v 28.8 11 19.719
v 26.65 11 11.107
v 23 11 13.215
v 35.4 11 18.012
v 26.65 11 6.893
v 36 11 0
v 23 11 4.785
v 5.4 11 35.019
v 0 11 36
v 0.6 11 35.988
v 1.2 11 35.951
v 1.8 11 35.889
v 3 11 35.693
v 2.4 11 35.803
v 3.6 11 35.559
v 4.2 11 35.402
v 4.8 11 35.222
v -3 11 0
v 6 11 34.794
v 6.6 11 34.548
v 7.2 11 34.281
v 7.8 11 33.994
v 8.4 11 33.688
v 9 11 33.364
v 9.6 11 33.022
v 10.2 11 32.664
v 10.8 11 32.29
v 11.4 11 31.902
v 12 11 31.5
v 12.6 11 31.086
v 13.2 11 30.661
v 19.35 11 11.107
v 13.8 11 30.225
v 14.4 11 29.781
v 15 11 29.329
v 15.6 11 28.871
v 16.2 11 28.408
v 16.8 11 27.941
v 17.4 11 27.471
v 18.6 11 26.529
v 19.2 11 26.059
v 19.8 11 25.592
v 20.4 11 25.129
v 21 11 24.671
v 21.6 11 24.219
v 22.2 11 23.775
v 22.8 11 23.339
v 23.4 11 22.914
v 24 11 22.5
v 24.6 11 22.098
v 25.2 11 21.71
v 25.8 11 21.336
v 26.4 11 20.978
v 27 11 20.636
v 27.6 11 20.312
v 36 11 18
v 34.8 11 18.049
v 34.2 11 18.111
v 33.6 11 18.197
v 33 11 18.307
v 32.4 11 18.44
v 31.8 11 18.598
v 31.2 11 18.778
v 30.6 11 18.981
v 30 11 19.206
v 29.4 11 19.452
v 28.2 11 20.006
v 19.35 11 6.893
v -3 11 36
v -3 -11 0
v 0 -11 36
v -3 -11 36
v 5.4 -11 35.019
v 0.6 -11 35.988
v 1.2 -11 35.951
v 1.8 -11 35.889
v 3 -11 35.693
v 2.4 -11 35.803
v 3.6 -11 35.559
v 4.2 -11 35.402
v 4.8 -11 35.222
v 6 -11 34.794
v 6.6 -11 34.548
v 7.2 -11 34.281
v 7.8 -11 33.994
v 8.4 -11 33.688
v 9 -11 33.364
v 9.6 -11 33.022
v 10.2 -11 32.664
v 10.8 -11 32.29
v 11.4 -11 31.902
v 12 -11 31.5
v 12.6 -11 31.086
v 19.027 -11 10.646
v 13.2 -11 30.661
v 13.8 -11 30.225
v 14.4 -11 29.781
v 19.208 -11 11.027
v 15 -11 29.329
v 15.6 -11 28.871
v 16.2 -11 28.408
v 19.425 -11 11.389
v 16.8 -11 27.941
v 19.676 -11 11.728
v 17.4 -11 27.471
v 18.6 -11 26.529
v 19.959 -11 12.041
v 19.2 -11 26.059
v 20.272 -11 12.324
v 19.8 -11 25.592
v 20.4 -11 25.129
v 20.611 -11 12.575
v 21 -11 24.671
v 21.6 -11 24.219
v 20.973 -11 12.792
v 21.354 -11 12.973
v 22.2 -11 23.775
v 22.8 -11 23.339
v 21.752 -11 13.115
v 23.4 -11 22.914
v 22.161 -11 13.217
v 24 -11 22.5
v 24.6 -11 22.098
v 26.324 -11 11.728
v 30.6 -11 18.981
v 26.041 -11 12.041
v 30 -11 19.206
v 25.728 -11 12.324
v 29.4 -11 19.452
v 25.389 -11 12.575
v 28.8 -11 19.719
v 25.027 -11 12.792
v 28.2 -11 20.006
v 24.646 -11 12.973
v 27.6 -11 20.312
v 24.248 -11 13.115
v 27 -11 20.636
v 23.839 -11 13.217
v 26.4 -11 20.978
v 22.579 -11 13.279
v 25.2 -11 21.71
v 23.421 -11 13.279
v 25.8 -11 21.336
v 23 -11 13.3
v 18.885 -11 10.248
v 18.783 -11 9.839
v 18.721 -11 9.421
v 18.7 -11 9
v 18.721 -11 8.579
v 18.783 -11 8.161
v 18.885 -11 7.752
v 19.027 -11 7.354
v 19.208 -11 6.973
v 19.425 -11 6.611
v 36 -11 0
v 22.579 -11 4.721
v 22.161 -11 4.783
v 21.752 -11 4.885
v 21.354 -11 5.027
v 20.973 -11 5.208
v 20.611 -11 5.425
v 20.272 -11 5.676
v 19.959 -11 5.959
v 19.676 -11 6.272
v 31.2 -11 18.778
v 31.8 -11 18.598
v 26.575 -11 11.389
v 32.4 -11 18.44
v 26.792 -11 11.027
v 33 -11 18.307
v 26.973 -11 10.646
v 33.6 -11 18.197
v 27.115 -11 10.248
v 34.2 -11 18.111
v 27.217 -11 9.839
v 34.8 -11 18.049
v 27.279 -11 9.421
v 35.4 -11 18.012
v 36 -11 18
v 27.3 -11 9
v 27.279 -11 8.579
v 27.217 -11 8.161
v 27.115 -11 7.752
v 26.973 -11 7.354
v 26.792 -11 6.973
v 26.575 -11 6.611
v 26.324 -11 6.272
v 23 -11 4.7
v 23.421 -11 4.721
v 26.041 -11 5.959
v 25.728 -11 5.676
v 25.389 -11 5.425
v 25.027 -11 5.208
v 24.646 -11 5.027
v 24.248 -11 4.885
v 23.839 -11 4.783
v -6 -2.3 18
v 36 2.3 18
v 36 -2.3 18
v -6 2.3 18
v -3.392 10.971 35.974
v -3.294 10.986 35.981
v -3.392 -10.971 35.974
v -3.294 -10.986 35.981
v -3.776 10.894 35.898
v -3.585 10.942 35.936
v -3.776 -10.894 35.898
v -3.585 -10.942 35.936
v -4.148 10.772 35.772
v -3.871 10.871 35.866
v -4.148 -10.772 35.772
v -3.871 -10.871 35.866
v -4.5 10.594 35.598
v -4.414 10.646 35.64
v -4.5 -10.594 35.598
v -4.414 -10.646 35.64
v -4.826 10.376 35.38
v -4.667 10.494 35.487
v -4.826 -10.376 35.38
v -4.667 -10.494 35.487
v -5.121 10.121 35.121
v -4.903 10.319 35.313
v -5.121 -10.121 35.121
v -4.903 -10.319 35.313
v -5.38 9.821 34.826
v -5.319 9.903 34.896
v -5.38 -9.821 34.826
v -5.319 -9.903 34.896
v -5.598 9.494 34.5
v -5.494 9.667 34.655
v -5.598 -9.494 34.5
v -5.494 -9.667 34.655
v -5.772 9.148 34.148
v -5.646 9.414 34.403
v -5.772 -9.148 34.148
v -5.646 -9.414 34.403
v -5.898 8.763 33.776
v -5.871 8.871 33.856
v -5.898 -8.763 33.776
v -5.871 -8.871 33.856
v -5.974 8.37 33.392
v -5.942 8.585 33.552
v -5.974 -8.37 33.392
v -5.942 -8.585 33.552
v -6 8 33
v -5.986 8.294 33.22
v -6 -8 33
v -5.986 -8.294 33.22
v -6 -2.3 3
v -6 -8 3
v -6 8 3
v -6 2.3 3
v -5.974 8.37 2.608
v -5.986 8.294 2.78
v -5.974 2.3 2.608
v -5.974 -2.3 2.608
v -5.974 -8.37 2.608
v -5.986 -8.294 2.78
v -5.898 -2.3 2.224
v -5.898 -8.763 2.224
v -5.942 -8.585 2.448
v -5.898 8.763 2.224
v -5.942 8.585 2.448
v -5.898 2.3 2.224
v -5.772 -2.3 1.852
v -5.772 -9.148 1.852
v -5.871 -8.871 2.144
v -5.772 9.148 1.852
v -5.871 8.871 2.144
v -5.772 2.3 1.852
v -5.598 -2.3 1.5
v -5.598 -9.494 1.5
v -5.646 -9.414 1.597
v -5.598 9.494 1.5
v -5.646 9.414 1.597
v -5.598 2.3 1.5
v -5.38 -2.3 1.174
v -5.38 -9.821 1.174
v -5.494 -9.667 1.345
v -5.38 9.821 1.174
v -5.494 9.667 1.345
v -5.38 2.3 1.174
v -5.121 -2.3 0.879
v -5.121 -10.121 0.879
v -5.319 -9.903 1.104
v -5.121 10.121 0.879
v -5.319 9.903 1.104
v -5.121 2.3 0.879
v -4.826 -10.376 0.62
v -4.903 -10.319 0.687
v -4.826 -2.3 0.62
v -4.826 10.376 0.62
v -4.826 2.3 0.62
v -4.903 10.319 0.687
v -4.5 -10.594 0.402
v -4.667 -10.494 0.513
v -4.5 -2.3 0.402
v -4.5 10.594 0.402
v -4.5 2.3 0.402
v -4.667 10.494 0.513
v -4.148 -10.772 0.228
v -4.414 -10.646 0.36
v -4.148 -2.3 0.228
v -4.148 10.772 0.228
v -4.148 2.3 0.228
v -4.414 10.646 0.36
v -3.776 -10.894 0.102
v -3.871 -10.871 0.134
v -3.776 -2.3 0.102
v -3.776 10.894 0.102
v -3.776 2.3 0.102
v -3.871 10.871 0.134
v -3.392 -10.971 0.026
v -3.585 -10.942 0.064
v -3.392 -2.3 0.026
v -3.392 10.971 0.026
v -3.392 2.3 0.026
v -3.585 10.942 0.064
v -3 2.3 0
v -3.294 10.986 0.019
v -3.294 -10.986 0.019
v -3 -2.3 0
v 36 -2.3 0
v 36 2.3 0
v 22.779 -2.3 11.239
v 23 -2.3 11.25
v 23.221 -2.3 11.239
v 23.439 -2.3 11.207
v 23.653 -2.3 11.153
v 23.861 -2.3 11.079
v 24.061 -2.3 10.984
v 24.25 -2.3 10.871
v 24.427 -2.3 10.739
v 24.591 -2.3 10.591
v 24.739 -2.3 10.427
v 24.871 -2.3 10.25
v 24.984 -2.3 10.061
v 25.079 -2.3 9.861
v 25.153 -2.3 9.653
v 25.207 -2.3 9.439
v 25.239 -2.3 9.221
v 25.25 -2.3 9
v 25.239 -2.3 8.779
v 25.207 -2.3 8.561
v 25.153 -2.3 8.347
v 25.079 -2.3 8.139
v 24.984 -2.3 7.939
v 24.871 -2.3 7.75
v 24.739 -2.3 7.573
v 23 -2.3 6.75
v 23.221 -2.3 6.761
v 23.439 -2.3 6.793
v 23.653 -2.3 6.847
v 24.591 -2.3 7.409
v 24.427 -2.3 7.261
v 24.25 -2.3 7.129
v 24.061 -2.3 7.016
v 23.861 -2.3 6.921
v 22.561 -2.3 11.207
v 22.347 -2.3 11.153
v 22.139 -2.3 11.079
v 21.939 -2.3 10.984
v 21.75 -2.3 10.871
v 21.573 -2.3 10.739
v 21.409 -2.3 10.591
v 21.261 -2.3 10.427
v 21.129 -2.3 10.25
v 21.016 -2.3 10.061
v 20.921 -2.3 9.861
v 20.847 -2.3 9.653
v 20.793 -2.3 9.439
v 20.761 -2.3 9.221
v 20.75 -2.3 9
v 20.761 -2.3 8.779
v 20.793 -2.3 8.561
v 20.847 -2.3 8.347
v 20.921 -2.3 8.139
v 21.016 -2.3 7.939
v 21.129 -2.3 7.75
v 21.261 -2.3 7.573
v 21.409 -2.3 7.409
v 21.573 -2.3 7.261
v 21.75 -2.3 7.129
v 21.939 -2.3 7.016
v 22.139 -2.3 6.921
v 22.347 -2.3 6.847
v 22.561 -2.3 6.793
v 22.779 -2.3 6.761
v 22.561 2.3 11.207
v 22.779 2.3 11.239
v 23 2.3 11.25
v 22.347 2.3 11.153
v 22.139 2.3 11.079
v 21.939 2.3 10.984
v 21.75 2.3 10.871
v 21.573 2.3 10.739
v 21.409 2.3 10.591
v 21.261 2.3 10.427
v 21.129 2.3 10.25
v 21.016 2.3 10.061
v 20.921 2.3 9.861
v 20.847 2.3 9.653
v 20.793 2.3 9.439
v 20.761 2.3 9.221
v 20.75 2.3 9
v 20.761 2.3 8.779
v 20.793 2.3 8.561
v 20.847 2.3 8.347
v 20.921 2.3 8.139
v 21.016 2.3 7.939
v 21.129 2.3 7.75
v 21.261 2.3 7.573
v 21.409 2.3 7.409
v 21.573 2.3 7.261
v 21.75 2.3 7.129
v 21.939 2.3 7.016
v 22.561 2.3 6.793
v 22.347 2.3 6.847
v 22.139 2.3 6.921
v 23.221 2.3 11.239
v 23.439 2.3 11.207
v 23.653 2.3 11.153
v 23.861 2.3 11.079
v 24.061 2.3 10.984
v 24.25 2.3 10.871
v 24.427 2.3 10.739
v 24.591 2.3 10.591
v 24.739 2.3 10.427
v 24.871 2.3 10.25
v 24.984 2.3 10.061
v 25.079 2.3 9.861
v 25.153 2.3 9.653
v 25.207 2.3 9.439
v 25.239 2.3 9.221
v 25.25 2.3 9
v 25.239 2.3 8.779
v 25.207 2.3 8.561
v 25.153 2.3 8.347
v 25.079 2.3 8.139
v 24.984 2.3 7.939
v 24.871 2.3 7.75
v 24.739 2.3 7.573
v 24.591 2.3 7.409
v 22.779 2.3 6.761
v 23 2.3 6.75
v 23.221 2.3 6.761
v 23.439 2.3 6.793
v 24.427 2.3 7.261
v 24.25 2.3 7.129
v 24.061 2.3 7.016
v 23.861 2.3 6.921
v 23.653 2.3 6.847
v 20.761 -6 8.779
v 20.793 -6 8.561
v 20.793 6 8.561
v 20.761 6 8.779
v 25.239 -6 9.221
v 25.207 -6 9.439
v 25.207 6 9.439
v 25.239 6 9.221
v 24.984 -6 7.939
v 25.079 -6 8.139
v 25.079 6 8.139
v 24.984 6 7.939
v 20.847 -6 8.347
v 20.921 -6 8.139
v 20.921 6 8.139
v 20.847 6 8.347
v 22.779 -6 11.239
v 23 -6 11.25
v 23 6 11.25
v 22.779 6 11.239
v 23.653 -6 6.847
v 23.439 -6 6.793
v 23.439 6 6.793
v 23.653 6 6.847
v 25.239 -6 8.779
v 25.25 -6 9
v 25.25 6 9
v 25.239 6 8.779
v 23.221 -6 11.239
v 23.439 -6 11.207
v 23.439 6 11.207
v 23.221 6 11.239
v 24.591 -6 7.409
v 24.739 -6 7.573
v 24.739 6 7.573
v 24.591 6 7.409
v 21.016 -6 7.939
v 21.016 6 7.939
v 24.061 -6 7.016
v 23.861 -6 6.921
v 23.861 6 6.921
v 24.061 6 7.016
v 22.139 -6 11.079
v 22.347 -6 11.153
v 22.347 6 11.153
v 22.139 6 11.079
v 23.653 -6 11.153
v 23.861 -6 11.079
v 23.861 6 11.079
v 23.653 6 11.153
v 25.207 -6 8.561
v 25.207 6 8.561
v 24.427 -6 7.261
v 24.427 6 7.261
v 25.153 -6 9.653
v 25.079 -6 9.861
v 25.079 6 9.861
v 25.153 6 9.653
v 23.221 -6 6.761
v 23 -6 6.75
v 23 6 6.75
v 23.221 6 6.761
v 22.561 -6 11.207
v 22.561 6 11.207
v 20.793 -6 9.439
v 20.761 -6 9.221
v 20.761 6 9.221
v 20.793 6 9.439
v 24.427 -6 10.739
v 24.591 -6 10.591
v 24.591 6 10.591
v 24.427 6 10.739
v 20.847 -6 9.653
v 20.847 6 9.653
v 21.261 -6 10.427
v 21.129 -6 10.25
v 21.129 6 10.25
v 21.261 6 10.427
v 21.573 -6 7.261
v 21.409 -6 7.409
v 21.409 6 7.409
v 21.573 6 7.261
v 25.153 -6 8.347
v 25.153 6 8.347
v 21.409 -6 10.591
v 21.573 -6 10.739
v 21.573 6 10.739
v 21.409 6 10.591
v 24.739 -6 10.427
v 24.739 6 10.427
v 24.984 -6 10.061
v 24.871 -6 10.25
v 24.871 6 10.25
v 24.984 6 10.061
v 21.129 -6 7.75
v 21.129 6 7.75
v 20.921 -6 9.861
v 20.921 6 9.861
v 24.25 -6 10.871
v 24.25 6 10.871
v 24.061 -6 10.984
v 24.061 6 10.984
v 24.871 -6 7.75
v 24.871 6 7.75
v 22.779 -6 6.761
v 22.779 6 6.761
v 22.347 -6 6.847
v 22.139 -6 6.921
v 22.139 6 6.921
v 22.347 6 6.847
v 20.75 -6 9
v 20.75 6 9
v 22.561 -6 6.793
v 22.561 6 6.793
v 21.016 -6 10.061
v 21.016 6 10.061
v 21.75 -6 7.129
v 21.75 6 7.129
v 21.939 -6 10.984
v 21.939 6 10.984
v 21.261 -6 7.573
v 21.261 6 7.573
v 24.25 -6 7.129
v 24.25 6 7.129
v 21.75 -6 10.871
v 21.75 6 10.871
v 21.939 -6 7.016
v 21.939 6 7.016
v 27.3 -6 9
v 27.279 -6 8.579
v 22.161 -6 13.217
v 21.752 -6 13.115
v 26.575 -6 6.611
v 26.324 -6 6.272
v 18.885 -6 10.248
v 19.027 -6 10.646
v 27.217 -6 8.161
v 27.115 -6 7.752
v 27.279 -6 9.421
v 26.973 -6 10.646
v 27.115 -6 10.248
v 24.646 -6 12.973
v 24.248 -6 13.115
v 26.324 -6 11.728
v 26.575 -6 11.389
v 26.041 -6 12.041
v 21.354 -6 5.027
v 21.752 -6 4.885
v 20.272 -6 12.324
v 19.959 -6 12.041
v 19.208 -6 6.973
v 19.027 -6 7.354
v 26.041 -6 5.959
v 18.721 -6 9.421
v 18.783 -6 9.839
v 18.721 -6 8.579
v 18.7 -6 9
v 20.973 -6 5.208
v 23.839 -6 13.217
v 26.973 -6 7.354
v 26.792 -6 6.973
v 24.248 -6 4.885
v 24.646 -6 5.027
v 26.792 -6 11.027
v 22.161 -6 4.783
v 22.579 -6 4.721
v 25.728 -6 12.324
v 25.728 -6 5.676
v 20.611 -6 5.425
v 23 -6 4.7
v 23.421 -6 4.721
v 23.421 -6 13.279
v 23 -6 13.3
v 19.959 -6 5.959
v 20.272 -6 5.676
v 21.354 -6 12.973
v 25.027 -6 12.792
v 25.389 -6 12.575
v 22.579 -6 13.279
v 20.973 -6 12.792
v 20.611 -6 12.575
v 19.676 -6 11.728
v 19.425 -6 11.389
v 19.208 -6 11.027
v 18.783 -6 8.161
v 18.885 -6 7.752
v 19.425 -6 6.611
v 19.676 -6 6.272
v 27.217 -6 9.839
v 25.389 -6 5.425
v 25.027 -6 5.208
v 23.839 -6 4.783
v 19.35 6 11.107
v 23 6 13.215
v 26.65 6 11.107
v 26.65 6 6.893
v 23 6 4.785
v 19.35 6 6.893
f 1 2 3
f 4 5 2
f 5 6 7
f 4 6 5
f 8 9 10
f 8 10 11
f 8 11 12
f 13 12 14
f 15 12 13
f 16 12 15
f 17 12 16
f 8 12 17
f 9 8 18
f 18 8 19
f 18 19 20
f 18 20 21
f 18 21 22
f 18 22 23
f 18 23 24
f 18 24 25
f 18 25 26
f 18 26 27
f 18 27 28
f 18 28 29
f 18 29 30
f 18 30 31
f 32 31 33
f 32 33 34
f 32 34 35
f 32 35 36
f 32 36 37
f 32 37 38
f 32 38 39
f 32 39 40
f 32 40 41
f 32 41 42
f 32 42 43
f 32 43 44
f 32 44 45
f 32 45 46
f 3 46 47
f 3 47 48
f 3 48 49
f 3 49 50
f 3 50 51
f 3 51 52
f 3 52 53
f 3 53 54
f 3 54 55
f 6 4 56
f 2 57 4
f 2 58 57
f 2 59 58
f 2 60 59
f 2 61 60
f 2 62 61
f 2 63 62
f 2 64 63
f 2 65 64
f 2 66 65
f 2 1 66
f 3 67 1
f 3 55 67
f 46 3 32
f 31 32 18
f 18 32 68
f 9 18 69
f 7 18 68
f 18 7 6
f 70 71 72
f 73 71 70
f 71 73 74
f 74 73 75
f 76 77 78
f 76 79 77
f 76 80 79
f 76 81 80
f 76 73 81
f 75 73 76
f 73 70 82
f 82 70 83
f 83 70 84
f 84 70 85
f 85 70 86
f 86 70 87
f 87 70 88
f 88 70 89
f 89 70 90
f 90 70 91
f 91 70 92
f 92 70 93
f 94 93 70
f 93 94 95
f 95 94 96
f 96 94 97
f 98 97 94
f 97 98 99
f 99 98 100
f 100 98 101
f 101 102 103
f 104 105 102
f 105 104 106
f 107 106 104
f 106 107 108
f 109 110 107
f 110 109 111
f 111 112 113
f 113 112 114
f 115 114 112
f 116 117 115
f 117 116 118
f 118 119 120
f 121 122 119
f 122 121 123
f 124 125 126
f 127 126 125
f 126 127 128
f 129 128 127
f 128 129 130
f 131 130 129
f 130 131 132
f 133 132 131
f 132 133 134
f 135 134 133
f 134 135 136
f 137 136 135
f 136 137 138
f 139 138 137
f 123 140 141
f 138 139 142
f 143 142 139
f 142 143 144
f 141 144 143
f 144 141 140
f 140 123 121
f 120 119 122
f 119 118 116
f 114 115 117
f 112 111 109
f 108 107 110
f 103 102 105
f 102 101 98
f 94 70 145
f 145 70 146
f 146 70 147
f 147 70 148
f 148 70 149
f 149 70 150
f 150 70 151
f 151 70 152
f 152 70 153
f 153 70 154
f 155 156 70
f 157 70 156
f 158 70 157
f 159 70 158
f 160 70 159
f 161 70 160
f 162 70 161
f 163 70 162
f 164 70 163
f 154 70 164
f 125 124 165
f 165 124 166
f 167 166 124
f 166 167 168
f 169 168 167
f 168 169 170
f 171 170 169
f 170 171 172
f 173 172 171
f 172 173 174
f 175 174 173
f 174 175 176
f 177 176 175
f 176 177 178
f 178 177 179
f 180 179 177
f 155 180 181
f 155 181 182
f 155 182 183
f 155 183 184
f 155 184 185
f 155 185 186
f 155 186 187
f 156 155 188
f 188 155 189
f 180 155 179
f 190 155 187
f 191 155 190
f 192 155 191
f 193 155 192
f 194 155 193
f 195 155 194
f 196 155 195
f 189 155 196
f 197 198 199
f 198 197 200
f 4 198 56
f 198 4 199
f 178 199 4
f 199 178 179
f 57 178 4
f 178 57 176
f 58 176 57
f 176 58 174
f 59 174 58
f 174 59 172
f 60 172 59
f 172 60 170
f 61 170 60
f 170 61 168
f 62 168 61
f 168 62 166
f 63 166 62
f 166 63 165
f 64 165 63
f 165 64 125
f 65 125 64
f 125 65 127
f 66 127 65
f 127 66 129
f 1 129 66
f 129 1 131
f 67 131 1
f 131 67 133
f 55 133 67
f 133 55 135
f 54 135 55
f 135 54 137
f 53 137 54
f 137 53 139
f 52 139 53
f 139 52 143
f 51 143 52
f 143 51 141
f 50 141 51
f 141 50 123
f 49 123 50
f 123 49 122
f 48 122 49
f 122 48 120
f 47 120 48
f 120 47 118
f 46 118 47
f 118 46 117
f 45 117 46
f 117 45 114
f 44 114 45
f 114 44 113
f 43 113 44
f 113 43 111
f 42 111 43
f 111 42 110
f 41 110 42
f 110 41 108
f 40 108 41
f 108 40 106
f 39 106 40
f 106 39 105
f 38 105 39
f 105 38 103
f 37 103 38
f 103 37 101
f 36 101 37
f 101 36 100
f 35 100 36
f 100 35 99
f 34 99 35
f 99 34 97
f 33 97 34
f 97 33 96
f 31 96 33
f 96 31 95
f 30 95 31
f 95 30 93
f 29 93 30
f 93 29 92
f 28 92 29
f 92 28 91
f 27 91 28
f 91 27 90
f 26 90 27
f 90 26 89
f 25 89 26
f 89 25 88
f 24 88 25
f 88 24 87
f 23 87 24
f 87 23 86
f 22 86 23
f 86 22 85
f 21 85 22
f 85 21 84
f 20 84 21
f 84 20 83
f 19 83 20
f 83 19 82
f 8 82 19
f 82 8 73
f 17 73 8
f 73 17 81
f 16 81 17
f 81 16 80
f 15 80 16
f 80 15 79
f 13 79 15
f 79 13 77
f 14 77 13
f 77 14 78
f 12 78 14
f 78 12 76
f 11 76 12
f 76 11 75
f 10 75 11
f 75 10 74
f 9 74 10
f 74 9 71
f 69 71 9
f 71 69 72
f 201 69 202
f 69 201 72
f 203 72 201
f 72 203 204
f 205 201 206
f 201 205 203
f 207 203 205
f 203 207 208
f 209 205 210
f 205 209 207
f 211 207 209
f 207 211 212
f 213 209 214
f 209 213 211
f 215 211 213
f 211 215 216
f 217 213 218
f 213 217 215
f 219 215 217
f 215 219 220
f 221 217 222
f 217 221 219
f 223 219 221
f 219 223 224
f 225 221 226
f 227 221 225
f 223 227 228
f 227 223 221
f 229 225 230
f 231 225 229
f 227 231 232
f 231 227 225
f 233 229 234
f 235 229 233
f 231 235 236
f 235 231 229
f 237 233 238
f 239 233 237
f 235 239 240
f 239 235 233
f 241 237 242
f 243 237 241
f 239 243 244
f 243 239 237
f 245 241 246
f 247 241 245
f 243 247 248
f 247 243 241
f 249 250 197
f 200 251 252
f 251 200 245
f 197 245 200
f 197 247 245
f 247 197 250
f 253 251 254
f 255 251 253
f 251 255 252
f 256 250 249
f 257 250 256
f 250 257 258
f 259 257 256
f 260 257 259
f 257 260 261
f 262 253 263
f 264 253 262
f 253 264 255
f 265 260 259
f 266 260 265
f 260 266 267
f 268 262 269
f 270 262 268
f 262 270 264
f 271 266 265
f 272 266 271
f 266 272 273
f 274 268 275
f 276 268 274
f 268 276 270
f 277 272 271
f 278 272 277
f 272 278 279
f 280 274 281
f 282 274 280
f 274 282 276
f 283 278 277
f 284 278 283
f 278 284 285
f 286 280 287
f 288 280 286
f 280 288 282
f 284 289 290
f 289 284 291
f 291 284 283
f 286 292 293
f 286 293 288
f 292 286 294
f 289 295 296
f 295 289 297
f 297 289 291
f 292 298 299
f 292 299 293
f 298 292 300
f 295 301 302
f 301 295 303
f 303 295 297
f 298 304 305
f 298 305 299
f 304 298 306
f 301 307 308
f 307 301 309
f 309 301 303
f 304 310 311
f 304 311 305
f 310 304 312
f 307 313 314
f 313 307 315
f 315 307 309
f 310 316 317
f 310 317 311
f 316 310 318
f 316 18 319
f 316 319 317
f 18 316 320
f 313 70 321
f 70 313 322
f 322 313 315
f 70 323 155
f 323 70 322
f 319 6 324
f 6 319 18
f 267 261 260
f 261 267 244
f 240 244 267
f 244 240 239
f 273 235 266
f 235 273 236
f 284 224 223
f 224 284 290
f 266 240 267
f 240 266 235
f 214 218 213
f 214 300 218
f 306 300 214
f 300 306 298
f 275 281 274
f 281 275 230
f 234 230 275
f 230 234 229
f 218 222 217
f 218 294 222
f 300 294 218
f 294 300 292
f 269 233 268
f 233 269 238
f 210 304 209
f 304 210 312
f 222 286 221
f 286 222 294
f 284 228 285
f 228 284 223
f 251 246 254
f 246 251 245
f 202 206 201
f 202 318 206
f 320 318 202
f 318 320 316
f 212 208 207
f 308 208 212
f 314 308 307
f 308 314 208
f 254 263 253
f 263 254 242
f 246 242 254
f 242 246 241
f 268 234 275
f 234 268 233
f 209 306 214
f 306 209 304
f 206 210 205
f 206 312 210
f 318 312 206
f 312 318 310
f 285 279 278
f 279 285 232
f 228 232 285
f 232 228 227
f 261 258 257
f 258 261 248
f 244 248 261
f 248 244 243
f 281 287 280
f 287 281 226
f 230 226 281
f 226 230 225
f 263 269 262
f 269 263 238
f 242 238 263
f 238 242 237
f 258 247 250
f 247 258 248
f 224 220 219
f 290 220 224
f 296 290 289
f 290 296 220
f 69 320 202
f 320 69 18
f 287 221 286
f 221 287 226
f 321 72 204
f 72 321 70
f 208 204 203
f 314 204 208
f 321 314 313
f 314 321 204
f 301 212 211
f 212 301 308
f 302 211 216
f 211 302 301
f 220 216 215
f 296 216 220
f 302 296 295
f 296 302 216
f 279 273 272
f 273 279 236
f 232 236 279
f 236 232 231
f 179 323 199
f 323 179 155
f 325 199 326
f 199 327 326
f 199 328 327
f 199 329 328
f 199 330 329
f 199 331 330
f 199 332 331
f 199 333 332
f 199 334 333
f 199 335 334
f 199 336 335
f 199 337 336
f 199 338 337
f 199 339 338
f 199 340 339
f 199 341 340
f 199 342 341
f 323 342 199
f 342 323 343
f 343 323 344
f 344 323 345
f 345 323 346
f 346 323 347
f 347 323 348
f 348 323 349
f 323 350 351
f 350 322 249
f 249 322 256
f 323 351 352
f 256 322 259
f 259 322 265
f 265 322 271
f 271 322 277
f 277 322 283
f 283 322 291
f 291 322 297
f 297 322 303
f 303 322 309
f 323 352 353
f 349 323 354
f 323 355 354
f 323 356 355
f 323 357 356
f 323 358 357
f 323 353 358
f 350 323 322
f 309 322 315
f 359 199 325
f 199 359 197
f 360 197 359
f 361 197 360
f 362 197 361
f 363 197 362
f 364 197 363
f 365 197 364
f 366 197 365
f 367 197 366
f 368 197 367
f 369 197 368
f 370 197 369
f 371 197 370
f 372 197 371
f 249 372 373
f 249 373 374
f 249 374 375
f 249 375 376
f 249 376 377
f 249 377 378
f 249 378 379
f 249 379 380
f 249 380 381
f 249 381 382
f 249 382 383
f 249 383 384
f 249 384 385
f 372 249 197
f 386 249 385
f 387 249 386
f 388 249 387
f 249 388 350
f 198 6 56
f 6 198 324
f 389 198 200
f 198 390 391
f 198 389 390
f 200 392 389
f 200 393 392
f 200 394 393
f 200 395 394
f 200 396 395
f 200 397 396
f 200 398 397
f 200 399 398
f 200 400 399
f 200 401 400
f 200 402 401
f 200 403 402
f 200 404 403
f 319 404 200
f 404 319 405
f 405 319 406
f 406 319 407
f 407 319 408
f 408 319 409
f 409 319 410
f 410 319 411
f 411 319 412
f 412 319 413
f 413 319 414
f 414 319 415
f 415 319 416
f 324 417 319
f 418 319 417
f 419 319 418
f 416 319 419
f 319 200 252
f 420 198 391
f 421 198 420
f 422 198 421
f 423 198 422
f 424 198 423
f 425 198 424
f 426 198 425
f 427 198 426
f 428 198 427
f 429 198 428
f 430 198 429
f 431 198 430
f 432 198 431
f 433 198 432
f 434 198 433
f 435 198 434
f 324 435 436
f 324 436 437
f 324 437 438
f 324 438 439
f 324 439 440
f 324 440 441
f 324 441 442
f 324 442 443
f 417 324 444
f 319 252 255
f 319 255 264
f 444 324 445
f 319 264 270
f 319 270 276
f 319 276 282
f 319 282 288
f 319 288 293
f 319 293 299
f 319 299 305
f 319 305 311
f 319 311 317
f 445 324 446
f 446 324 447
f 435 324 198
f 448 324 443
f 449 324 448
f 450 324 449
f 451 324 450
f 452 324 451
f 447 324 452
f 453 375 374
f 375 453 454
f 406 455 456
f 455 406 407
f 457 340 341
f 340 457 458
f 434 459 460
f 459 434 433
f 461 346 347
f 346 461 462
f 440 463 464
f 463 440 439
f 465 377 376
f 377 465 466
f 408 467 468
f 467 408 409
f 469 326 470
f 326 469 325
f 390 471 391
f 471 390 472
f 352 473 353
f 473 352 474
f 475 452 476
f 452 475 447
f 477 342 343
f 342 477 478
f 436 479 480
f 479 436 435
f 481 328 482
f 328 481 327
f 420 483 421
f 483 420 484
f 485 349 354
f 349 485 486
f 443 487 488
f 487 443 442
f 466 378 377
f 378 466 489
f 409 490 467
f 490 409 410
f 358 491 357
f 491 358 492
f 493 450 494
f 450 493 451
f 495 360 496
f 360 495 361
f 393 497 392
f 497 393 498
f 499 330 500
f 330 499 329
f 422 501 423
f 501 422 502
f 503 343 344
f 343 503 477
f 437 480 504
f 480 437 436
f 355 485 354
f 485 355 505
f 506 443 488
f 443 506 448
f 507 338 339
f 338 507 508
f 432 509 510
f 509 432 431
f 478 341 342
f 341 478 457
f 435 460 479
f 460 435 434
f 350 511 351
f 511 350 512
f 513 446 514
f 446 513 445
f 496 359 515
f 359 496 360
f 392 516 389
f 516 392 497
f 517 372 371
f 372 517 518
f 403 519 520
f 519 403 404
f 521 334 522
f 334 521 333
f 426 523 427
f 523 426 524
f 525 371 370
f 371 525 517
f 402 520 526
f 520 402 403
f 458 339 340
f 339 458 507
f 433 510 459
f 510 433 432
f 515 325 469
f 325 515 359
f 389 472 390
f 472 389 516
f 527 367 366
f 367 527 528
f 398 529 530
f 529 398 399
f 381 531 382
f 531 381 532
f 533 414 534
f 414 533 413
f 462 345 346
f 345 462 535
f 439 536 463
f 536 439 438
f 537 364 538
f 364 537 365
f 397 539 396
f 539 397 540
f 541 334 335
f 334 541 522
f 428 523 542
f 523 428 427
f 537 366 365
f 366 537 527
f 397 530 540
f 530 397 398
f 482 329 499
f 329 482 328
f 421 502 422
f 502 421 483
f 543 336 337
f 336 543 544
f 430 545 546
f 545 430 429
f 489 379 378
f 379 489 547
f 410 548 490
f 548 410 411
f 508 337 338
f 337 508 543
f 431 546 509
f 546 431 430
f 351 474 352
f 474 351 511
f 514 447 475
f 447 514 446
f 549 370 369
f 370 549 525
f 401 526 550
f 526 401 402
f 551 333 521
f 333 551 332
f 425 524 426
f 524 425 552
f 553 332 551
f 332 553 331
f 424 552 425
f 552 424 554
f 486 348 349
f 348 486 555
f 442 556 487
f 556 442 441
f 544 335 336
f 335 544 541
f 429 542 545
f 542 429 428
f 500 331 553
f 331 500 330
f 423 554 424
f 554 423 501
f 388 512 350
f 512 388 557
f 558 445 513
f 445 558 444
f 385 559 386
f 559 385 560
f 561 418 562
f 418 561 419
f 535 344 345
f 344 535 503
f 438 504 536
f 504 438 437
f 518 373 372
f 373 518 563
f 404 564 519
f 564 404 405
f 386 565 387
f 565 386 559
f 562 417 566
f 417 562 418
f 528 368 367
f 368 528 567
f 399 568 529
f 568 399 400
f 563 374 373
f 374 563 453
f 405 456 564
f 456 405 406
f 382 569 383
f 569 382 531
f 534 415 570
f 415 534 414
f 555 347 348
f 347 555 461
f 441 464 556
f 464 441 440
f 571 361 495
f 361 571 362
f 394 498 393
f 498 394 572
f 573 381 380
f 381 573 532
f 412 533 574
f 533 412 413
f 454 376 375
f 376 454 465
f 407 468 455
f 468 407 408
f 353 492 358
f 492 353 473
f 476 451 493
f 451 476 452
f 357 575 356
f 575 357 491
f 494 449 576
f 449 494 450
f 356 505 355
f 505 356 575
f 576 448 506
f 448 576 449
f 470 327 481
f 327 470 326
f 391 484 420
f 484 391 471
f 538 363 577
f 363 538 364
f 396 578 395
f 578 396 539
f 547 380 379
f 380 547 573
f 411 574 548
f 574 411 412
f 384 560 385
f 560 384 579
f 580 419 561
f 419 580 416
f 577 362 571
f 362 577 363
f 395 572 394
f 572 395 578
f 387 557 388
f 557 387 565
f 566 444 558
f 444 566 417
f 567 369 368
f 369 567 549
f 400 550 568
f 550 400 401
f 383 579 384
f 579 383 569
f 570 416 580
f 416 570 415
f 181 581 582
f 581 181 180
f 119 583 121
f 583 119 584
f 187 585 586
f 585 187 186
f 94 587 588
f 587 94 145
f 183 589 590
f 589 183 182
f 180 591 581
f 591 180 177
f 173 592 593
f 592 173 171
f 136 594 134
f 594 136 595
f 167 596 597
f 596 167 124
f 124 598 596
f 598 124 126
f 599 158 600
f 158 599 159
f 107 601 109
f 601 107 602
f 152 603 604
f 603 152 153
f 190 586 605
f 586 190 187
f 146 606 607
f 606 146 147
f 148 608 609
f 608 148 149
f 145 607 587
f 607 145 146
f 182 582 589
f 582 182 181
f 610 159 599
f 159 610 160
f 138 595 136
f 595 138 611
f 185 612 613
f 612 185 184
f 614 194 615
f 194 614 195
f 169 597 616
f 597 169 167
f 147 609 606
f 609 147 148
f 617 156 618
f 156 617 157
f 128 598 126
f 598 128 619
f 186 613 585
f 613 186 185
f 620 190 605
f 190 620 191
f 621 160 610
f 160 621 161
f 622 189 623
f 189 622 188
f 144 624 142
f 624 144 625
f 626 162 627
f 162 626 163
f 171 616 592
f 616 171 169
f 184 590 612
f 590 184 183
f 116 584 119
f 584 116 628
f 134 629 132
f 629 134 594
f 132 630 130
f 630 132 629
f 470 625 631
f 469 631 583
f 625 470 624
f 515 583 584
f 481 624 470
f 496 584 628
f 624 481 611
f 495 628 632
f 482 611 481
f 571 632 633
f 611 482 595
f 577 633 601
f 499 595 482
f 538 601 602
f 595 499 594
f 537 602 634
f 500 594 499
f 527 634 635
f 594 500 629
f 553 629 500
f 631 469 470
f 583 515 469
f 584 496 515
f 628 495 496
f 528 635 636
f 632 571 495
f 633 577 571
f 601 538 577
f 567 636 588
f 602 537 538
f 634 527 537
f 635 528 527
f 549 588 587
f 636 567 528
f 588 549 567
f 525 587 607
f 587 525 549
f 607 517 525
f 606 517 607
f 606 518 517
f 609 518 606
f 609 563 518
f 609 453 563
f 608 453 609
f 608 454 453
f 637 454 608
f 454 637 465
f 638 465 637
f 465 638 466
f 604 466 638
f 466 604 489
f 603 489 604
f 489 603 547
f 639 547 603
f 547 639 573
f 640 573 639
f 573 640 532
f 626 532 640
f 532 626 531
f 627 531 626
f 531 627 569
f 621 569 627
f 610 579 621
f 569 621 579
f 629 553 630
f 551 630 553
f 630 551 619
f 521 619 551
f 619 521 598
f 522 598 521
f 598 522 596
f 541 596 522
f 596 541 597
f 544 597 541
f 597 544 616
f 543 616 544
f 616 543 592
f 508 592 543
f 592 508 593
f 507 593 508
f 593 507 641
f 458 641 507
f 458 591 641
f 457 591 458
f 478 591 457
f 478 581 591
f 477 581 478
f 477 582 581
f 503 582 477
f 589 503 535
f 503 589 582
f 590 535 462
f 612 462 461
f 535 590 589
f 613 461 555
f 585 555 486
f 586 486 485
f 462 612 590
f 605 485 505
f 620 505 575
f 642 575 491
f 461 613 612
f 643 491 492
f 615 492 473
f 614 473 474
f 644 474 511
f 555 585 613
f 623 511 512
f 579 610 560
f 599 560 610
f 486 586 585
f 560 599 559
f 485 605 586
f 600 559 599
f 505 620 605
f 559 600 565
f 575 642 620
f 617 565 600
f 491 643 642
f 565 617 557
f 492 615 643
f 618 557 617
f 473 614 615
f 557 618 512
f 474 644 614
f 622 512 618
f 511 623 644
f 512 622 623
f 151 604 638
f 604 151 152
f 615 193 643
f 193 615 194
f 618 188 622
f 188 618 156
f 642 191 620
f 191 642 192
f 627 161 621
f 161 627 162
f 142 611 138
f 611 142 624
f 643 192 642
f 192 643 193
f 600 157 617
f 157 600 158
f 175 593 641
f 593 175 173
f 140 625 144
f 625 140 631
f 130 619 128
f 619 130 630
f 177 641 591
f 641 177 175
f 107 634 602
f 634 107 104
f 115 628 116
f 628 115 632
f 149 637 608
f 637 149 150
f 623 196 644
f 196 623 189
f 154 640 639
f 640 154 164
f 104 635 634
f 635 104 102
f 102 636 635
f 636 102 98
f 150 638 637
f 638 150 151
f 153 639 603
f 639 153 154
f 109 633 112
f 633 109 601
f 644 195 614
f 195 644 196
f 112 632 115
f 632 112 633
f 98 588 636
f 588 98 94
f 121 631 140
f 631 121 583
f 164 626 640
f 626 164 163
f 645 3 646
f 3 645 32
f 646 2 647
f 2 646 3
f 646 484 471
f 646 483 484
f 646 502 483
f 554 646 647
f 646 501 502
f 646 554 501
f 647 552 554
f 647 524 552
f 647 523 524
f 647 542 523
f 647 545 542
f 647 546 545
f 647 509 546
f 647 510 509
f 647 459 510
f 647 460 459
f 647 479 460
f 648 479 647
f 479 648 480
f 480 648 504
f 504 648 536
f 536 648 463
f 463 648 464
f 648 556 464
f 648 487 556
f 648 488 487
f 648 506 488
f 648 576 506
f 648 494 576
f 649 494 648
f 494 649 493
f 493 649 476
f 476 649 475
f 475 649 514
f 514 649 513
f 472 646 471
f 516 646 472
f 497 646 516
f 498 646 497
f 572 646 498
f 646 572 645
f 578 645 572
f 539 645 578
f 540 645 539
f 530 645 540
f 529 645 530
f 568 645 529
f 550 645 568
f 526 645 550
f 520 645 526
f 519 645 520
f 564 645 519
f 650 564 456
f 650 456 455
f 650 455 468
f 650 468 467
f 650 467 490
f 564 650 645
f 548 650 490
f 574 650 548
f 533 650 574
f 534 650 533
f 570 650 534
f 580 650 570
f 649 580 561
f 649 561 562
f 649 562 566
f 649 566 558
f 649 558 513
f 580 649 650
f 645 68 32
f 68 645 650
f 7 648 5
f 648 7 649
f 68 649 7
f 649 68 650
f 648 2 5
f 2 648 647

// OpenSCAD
// Batente v7 para a ponta do suporte das cadeiras (OpenSCAD)
// Eixos: X ao longo do suporte (X=0 na ponta, cresce para dentro do suporte),
//        Y na largura (centrado), Z para cima (Z=0 no fundo do canal).
// Medidas em mm. Parafuso M4 x 16 + porca M4. Cavidades com o formato exato.
// O suporte nao tem paredes externas: a peca tem 22 mm de largura em todos os pontos.
// v7: sulco central de ponta a ponta e 1 mm mais largo; bordas da face externa da parede arredondadas
//     (so o contorno externo, o sulco por dentro fica com cantos vivos); ponta das garras reta.

$fn = 64;

// ---------- Medidas do suporte ----------
LARG      = 22;     // largura total (tambem a largura da peca)
DIV       = 3;      // divisao do meio
ALT_CANAL = 18;     // altura do canal
FURO_X    = 23;     // centro do furo de 5 mm, a partir da ponta

// ---------- Parametros da peca ----------
FOLGA      = 0.3;   // folga de encaixe para impressao 3D
ESP_PAREDE = 6;     // espessura da parede na ponta (X de -6 a 0)
ALT_PAREDE = 18;    // altura da parede acima do canal
COMP_GARRA = 36;    // comprimento das garras dentro dos canais
FOLGA_SULCO = 0.5;  // folga extra de cada lado do sulco (sulco 1 mm mais largo)
R_BORDA    = 3;     // raio do arredondamento das bordas da face externa da parede

// ---------- Parafuso M4 x 16 e porca M4 ----------
FURO_D     = 4.5;   // furo passante M4
CABECA_D   = 8.6;   // cabeca panela M4 (8,0) + folga
CABECA_PROF = 5.0;  // cabeca panela (3,1) ou cilindrica (4,0) fica rebaixada
PORCA_AF   = 7.3;   // porca M4: 7,0 entre faces + folga
PORCA_PROF = 5.0;   // porca M4 (3,2) encostada no fundo; M4x16 atravessa a porca inteira

// ---------- Derivados ----------
VAO        = DIV + 2*FOLGA + 2*FOLGA_SULCO; // sulco central onde passa a divisao (4,6 mm)
LARG_GARRA = (LARG - VAO) / 2;          // cada garra vai da borda de 22 mm ate o vao
Y_CENTRO   = VAO/2 + LARG_GARRA/2;      // centro de cada garra
Y_EXT      = LARG/2;                    // face externa da garra (|Y| = 11)
Z_FURO     = ALT_CANAL/2;
R_PORCA    = PORCA_AF / sqrt(3);        // raio circunscrito do sextavado
TOPO       = ALT_CANAL + ALT_PAREDE;

// ---------- Perfil lateral: parede + rampa que termina rente ao topo do canal ----------
N = 60;
rampa = [ for (i = [0:N]) let(t = i/N)
          [ COMP_GARRA*t, ALT_CANAL + ALT_PAREDE*0.5*(1 + cos(180*t)) ] ];
// Cantos de baixo e de cima da face externa da parede, arredondados em arco
function arco(cx, cz, a0, a1) = [ for (i = [0:12]) let(a = a0 + (a1 - a0)*i/12)
                                  [ cx + R_BORDA*cos(a), cz + R_BORDA*sin(a) ] ];
perfil = concat([[0, 0]],
                arco(-ESP_PAREDE + R_BORDA, R_BORDA, 270, 180),          // canto de baixo
                arco(-ESP_PAREDE + R_BORDA, TOPO - R_BORDA, 180, 90),    // canto de cima
                rampa,
                [[COMP_GARRA, ALT_CANAL], [0, ALT_CANAL]]);

module cabeca() {
    // perfil em XZ extrudado ao longo de Y, centrado; a planta arredonda as duas
    // quinas verticais da face externa da parede
    intersection() {
        rotate([90, 0, 0]) linear_extrude(height = LARG, center = true) polygon(perfil);
        translate([0, 0, -1]) linear_extrude(height = TOPO + 2) hull() {
            translate([-ESP_PAREDE + R_BORDA, -LARG/2])
                square([ESP_PAREDE + COMP_GARRA - R_BORDA, LARG]);
            for (lado = [-1, 1])
                translate([-ESP_PAREDE + R_BORDA, lado*(LARG/2 - R_BORDA)]) circle(r = R_BORDA);
        }
    }
}

module garra(y0, y1) {
    // garra reta entre y0 e y1; entra 0,5 mm na parede para soldar no mesmo corpo
    translate([-0.5, y0, 0]) cube([COMP_GARRA + 0.5, y1 - y0, ALT_CANAL]);
}

module garras() {
    // duas garras que somam 22 mm de largura, com o sulco no meio
    garra(-Y_EXT, -VAO/2);
    garra(VAO/2, Y_EXT);
}

module sulco_passante() {
    // sulco central de ponta a ponta: atravessa tambem a parede da ponta
    translate([-ESP_PAREDE - 1, -VAO/2, -1])
        cube([ESP_PAREDE + COMP_GARRA + 2, VAO, ALT_CANAL + 1]);
}

module furo_parafuso() {
    translate([FURO_X, 0, Z_FURO]) rotate([90, 0, 0])
        cylinder(d = FURO_D, h = LARG + 4, center = true);
}

module rebaixo_cabeca() {   // cilindro exato, no lado -Y
    translate([FURO_X, -Y_EXT - 0.01, Z_FURO]) rotate([-90, 0, 0])
        cylinder(d = CABECA_D, h = CABECA_PROF + 0.01);
}

module sextavado_porca() {  // sextavado exato, no lado +Y
    translate([FURO_X, Y_EXT + 0.01, Z_FURO]) rotate([90, 0, 0])
        rotate([0, 0, 30])  // cantos para cima/baixo, faces planas nas laterais
            cylinder(r = R_PORCA, h = PORCA_PROF + 0.01, $fn = 6);
}

difference() {
    union() { cabeca(); garras(); }
    sulco_passante();
    furo_parafuso();
    rebaixo_cabeca();
    sextavado_porca();
}
